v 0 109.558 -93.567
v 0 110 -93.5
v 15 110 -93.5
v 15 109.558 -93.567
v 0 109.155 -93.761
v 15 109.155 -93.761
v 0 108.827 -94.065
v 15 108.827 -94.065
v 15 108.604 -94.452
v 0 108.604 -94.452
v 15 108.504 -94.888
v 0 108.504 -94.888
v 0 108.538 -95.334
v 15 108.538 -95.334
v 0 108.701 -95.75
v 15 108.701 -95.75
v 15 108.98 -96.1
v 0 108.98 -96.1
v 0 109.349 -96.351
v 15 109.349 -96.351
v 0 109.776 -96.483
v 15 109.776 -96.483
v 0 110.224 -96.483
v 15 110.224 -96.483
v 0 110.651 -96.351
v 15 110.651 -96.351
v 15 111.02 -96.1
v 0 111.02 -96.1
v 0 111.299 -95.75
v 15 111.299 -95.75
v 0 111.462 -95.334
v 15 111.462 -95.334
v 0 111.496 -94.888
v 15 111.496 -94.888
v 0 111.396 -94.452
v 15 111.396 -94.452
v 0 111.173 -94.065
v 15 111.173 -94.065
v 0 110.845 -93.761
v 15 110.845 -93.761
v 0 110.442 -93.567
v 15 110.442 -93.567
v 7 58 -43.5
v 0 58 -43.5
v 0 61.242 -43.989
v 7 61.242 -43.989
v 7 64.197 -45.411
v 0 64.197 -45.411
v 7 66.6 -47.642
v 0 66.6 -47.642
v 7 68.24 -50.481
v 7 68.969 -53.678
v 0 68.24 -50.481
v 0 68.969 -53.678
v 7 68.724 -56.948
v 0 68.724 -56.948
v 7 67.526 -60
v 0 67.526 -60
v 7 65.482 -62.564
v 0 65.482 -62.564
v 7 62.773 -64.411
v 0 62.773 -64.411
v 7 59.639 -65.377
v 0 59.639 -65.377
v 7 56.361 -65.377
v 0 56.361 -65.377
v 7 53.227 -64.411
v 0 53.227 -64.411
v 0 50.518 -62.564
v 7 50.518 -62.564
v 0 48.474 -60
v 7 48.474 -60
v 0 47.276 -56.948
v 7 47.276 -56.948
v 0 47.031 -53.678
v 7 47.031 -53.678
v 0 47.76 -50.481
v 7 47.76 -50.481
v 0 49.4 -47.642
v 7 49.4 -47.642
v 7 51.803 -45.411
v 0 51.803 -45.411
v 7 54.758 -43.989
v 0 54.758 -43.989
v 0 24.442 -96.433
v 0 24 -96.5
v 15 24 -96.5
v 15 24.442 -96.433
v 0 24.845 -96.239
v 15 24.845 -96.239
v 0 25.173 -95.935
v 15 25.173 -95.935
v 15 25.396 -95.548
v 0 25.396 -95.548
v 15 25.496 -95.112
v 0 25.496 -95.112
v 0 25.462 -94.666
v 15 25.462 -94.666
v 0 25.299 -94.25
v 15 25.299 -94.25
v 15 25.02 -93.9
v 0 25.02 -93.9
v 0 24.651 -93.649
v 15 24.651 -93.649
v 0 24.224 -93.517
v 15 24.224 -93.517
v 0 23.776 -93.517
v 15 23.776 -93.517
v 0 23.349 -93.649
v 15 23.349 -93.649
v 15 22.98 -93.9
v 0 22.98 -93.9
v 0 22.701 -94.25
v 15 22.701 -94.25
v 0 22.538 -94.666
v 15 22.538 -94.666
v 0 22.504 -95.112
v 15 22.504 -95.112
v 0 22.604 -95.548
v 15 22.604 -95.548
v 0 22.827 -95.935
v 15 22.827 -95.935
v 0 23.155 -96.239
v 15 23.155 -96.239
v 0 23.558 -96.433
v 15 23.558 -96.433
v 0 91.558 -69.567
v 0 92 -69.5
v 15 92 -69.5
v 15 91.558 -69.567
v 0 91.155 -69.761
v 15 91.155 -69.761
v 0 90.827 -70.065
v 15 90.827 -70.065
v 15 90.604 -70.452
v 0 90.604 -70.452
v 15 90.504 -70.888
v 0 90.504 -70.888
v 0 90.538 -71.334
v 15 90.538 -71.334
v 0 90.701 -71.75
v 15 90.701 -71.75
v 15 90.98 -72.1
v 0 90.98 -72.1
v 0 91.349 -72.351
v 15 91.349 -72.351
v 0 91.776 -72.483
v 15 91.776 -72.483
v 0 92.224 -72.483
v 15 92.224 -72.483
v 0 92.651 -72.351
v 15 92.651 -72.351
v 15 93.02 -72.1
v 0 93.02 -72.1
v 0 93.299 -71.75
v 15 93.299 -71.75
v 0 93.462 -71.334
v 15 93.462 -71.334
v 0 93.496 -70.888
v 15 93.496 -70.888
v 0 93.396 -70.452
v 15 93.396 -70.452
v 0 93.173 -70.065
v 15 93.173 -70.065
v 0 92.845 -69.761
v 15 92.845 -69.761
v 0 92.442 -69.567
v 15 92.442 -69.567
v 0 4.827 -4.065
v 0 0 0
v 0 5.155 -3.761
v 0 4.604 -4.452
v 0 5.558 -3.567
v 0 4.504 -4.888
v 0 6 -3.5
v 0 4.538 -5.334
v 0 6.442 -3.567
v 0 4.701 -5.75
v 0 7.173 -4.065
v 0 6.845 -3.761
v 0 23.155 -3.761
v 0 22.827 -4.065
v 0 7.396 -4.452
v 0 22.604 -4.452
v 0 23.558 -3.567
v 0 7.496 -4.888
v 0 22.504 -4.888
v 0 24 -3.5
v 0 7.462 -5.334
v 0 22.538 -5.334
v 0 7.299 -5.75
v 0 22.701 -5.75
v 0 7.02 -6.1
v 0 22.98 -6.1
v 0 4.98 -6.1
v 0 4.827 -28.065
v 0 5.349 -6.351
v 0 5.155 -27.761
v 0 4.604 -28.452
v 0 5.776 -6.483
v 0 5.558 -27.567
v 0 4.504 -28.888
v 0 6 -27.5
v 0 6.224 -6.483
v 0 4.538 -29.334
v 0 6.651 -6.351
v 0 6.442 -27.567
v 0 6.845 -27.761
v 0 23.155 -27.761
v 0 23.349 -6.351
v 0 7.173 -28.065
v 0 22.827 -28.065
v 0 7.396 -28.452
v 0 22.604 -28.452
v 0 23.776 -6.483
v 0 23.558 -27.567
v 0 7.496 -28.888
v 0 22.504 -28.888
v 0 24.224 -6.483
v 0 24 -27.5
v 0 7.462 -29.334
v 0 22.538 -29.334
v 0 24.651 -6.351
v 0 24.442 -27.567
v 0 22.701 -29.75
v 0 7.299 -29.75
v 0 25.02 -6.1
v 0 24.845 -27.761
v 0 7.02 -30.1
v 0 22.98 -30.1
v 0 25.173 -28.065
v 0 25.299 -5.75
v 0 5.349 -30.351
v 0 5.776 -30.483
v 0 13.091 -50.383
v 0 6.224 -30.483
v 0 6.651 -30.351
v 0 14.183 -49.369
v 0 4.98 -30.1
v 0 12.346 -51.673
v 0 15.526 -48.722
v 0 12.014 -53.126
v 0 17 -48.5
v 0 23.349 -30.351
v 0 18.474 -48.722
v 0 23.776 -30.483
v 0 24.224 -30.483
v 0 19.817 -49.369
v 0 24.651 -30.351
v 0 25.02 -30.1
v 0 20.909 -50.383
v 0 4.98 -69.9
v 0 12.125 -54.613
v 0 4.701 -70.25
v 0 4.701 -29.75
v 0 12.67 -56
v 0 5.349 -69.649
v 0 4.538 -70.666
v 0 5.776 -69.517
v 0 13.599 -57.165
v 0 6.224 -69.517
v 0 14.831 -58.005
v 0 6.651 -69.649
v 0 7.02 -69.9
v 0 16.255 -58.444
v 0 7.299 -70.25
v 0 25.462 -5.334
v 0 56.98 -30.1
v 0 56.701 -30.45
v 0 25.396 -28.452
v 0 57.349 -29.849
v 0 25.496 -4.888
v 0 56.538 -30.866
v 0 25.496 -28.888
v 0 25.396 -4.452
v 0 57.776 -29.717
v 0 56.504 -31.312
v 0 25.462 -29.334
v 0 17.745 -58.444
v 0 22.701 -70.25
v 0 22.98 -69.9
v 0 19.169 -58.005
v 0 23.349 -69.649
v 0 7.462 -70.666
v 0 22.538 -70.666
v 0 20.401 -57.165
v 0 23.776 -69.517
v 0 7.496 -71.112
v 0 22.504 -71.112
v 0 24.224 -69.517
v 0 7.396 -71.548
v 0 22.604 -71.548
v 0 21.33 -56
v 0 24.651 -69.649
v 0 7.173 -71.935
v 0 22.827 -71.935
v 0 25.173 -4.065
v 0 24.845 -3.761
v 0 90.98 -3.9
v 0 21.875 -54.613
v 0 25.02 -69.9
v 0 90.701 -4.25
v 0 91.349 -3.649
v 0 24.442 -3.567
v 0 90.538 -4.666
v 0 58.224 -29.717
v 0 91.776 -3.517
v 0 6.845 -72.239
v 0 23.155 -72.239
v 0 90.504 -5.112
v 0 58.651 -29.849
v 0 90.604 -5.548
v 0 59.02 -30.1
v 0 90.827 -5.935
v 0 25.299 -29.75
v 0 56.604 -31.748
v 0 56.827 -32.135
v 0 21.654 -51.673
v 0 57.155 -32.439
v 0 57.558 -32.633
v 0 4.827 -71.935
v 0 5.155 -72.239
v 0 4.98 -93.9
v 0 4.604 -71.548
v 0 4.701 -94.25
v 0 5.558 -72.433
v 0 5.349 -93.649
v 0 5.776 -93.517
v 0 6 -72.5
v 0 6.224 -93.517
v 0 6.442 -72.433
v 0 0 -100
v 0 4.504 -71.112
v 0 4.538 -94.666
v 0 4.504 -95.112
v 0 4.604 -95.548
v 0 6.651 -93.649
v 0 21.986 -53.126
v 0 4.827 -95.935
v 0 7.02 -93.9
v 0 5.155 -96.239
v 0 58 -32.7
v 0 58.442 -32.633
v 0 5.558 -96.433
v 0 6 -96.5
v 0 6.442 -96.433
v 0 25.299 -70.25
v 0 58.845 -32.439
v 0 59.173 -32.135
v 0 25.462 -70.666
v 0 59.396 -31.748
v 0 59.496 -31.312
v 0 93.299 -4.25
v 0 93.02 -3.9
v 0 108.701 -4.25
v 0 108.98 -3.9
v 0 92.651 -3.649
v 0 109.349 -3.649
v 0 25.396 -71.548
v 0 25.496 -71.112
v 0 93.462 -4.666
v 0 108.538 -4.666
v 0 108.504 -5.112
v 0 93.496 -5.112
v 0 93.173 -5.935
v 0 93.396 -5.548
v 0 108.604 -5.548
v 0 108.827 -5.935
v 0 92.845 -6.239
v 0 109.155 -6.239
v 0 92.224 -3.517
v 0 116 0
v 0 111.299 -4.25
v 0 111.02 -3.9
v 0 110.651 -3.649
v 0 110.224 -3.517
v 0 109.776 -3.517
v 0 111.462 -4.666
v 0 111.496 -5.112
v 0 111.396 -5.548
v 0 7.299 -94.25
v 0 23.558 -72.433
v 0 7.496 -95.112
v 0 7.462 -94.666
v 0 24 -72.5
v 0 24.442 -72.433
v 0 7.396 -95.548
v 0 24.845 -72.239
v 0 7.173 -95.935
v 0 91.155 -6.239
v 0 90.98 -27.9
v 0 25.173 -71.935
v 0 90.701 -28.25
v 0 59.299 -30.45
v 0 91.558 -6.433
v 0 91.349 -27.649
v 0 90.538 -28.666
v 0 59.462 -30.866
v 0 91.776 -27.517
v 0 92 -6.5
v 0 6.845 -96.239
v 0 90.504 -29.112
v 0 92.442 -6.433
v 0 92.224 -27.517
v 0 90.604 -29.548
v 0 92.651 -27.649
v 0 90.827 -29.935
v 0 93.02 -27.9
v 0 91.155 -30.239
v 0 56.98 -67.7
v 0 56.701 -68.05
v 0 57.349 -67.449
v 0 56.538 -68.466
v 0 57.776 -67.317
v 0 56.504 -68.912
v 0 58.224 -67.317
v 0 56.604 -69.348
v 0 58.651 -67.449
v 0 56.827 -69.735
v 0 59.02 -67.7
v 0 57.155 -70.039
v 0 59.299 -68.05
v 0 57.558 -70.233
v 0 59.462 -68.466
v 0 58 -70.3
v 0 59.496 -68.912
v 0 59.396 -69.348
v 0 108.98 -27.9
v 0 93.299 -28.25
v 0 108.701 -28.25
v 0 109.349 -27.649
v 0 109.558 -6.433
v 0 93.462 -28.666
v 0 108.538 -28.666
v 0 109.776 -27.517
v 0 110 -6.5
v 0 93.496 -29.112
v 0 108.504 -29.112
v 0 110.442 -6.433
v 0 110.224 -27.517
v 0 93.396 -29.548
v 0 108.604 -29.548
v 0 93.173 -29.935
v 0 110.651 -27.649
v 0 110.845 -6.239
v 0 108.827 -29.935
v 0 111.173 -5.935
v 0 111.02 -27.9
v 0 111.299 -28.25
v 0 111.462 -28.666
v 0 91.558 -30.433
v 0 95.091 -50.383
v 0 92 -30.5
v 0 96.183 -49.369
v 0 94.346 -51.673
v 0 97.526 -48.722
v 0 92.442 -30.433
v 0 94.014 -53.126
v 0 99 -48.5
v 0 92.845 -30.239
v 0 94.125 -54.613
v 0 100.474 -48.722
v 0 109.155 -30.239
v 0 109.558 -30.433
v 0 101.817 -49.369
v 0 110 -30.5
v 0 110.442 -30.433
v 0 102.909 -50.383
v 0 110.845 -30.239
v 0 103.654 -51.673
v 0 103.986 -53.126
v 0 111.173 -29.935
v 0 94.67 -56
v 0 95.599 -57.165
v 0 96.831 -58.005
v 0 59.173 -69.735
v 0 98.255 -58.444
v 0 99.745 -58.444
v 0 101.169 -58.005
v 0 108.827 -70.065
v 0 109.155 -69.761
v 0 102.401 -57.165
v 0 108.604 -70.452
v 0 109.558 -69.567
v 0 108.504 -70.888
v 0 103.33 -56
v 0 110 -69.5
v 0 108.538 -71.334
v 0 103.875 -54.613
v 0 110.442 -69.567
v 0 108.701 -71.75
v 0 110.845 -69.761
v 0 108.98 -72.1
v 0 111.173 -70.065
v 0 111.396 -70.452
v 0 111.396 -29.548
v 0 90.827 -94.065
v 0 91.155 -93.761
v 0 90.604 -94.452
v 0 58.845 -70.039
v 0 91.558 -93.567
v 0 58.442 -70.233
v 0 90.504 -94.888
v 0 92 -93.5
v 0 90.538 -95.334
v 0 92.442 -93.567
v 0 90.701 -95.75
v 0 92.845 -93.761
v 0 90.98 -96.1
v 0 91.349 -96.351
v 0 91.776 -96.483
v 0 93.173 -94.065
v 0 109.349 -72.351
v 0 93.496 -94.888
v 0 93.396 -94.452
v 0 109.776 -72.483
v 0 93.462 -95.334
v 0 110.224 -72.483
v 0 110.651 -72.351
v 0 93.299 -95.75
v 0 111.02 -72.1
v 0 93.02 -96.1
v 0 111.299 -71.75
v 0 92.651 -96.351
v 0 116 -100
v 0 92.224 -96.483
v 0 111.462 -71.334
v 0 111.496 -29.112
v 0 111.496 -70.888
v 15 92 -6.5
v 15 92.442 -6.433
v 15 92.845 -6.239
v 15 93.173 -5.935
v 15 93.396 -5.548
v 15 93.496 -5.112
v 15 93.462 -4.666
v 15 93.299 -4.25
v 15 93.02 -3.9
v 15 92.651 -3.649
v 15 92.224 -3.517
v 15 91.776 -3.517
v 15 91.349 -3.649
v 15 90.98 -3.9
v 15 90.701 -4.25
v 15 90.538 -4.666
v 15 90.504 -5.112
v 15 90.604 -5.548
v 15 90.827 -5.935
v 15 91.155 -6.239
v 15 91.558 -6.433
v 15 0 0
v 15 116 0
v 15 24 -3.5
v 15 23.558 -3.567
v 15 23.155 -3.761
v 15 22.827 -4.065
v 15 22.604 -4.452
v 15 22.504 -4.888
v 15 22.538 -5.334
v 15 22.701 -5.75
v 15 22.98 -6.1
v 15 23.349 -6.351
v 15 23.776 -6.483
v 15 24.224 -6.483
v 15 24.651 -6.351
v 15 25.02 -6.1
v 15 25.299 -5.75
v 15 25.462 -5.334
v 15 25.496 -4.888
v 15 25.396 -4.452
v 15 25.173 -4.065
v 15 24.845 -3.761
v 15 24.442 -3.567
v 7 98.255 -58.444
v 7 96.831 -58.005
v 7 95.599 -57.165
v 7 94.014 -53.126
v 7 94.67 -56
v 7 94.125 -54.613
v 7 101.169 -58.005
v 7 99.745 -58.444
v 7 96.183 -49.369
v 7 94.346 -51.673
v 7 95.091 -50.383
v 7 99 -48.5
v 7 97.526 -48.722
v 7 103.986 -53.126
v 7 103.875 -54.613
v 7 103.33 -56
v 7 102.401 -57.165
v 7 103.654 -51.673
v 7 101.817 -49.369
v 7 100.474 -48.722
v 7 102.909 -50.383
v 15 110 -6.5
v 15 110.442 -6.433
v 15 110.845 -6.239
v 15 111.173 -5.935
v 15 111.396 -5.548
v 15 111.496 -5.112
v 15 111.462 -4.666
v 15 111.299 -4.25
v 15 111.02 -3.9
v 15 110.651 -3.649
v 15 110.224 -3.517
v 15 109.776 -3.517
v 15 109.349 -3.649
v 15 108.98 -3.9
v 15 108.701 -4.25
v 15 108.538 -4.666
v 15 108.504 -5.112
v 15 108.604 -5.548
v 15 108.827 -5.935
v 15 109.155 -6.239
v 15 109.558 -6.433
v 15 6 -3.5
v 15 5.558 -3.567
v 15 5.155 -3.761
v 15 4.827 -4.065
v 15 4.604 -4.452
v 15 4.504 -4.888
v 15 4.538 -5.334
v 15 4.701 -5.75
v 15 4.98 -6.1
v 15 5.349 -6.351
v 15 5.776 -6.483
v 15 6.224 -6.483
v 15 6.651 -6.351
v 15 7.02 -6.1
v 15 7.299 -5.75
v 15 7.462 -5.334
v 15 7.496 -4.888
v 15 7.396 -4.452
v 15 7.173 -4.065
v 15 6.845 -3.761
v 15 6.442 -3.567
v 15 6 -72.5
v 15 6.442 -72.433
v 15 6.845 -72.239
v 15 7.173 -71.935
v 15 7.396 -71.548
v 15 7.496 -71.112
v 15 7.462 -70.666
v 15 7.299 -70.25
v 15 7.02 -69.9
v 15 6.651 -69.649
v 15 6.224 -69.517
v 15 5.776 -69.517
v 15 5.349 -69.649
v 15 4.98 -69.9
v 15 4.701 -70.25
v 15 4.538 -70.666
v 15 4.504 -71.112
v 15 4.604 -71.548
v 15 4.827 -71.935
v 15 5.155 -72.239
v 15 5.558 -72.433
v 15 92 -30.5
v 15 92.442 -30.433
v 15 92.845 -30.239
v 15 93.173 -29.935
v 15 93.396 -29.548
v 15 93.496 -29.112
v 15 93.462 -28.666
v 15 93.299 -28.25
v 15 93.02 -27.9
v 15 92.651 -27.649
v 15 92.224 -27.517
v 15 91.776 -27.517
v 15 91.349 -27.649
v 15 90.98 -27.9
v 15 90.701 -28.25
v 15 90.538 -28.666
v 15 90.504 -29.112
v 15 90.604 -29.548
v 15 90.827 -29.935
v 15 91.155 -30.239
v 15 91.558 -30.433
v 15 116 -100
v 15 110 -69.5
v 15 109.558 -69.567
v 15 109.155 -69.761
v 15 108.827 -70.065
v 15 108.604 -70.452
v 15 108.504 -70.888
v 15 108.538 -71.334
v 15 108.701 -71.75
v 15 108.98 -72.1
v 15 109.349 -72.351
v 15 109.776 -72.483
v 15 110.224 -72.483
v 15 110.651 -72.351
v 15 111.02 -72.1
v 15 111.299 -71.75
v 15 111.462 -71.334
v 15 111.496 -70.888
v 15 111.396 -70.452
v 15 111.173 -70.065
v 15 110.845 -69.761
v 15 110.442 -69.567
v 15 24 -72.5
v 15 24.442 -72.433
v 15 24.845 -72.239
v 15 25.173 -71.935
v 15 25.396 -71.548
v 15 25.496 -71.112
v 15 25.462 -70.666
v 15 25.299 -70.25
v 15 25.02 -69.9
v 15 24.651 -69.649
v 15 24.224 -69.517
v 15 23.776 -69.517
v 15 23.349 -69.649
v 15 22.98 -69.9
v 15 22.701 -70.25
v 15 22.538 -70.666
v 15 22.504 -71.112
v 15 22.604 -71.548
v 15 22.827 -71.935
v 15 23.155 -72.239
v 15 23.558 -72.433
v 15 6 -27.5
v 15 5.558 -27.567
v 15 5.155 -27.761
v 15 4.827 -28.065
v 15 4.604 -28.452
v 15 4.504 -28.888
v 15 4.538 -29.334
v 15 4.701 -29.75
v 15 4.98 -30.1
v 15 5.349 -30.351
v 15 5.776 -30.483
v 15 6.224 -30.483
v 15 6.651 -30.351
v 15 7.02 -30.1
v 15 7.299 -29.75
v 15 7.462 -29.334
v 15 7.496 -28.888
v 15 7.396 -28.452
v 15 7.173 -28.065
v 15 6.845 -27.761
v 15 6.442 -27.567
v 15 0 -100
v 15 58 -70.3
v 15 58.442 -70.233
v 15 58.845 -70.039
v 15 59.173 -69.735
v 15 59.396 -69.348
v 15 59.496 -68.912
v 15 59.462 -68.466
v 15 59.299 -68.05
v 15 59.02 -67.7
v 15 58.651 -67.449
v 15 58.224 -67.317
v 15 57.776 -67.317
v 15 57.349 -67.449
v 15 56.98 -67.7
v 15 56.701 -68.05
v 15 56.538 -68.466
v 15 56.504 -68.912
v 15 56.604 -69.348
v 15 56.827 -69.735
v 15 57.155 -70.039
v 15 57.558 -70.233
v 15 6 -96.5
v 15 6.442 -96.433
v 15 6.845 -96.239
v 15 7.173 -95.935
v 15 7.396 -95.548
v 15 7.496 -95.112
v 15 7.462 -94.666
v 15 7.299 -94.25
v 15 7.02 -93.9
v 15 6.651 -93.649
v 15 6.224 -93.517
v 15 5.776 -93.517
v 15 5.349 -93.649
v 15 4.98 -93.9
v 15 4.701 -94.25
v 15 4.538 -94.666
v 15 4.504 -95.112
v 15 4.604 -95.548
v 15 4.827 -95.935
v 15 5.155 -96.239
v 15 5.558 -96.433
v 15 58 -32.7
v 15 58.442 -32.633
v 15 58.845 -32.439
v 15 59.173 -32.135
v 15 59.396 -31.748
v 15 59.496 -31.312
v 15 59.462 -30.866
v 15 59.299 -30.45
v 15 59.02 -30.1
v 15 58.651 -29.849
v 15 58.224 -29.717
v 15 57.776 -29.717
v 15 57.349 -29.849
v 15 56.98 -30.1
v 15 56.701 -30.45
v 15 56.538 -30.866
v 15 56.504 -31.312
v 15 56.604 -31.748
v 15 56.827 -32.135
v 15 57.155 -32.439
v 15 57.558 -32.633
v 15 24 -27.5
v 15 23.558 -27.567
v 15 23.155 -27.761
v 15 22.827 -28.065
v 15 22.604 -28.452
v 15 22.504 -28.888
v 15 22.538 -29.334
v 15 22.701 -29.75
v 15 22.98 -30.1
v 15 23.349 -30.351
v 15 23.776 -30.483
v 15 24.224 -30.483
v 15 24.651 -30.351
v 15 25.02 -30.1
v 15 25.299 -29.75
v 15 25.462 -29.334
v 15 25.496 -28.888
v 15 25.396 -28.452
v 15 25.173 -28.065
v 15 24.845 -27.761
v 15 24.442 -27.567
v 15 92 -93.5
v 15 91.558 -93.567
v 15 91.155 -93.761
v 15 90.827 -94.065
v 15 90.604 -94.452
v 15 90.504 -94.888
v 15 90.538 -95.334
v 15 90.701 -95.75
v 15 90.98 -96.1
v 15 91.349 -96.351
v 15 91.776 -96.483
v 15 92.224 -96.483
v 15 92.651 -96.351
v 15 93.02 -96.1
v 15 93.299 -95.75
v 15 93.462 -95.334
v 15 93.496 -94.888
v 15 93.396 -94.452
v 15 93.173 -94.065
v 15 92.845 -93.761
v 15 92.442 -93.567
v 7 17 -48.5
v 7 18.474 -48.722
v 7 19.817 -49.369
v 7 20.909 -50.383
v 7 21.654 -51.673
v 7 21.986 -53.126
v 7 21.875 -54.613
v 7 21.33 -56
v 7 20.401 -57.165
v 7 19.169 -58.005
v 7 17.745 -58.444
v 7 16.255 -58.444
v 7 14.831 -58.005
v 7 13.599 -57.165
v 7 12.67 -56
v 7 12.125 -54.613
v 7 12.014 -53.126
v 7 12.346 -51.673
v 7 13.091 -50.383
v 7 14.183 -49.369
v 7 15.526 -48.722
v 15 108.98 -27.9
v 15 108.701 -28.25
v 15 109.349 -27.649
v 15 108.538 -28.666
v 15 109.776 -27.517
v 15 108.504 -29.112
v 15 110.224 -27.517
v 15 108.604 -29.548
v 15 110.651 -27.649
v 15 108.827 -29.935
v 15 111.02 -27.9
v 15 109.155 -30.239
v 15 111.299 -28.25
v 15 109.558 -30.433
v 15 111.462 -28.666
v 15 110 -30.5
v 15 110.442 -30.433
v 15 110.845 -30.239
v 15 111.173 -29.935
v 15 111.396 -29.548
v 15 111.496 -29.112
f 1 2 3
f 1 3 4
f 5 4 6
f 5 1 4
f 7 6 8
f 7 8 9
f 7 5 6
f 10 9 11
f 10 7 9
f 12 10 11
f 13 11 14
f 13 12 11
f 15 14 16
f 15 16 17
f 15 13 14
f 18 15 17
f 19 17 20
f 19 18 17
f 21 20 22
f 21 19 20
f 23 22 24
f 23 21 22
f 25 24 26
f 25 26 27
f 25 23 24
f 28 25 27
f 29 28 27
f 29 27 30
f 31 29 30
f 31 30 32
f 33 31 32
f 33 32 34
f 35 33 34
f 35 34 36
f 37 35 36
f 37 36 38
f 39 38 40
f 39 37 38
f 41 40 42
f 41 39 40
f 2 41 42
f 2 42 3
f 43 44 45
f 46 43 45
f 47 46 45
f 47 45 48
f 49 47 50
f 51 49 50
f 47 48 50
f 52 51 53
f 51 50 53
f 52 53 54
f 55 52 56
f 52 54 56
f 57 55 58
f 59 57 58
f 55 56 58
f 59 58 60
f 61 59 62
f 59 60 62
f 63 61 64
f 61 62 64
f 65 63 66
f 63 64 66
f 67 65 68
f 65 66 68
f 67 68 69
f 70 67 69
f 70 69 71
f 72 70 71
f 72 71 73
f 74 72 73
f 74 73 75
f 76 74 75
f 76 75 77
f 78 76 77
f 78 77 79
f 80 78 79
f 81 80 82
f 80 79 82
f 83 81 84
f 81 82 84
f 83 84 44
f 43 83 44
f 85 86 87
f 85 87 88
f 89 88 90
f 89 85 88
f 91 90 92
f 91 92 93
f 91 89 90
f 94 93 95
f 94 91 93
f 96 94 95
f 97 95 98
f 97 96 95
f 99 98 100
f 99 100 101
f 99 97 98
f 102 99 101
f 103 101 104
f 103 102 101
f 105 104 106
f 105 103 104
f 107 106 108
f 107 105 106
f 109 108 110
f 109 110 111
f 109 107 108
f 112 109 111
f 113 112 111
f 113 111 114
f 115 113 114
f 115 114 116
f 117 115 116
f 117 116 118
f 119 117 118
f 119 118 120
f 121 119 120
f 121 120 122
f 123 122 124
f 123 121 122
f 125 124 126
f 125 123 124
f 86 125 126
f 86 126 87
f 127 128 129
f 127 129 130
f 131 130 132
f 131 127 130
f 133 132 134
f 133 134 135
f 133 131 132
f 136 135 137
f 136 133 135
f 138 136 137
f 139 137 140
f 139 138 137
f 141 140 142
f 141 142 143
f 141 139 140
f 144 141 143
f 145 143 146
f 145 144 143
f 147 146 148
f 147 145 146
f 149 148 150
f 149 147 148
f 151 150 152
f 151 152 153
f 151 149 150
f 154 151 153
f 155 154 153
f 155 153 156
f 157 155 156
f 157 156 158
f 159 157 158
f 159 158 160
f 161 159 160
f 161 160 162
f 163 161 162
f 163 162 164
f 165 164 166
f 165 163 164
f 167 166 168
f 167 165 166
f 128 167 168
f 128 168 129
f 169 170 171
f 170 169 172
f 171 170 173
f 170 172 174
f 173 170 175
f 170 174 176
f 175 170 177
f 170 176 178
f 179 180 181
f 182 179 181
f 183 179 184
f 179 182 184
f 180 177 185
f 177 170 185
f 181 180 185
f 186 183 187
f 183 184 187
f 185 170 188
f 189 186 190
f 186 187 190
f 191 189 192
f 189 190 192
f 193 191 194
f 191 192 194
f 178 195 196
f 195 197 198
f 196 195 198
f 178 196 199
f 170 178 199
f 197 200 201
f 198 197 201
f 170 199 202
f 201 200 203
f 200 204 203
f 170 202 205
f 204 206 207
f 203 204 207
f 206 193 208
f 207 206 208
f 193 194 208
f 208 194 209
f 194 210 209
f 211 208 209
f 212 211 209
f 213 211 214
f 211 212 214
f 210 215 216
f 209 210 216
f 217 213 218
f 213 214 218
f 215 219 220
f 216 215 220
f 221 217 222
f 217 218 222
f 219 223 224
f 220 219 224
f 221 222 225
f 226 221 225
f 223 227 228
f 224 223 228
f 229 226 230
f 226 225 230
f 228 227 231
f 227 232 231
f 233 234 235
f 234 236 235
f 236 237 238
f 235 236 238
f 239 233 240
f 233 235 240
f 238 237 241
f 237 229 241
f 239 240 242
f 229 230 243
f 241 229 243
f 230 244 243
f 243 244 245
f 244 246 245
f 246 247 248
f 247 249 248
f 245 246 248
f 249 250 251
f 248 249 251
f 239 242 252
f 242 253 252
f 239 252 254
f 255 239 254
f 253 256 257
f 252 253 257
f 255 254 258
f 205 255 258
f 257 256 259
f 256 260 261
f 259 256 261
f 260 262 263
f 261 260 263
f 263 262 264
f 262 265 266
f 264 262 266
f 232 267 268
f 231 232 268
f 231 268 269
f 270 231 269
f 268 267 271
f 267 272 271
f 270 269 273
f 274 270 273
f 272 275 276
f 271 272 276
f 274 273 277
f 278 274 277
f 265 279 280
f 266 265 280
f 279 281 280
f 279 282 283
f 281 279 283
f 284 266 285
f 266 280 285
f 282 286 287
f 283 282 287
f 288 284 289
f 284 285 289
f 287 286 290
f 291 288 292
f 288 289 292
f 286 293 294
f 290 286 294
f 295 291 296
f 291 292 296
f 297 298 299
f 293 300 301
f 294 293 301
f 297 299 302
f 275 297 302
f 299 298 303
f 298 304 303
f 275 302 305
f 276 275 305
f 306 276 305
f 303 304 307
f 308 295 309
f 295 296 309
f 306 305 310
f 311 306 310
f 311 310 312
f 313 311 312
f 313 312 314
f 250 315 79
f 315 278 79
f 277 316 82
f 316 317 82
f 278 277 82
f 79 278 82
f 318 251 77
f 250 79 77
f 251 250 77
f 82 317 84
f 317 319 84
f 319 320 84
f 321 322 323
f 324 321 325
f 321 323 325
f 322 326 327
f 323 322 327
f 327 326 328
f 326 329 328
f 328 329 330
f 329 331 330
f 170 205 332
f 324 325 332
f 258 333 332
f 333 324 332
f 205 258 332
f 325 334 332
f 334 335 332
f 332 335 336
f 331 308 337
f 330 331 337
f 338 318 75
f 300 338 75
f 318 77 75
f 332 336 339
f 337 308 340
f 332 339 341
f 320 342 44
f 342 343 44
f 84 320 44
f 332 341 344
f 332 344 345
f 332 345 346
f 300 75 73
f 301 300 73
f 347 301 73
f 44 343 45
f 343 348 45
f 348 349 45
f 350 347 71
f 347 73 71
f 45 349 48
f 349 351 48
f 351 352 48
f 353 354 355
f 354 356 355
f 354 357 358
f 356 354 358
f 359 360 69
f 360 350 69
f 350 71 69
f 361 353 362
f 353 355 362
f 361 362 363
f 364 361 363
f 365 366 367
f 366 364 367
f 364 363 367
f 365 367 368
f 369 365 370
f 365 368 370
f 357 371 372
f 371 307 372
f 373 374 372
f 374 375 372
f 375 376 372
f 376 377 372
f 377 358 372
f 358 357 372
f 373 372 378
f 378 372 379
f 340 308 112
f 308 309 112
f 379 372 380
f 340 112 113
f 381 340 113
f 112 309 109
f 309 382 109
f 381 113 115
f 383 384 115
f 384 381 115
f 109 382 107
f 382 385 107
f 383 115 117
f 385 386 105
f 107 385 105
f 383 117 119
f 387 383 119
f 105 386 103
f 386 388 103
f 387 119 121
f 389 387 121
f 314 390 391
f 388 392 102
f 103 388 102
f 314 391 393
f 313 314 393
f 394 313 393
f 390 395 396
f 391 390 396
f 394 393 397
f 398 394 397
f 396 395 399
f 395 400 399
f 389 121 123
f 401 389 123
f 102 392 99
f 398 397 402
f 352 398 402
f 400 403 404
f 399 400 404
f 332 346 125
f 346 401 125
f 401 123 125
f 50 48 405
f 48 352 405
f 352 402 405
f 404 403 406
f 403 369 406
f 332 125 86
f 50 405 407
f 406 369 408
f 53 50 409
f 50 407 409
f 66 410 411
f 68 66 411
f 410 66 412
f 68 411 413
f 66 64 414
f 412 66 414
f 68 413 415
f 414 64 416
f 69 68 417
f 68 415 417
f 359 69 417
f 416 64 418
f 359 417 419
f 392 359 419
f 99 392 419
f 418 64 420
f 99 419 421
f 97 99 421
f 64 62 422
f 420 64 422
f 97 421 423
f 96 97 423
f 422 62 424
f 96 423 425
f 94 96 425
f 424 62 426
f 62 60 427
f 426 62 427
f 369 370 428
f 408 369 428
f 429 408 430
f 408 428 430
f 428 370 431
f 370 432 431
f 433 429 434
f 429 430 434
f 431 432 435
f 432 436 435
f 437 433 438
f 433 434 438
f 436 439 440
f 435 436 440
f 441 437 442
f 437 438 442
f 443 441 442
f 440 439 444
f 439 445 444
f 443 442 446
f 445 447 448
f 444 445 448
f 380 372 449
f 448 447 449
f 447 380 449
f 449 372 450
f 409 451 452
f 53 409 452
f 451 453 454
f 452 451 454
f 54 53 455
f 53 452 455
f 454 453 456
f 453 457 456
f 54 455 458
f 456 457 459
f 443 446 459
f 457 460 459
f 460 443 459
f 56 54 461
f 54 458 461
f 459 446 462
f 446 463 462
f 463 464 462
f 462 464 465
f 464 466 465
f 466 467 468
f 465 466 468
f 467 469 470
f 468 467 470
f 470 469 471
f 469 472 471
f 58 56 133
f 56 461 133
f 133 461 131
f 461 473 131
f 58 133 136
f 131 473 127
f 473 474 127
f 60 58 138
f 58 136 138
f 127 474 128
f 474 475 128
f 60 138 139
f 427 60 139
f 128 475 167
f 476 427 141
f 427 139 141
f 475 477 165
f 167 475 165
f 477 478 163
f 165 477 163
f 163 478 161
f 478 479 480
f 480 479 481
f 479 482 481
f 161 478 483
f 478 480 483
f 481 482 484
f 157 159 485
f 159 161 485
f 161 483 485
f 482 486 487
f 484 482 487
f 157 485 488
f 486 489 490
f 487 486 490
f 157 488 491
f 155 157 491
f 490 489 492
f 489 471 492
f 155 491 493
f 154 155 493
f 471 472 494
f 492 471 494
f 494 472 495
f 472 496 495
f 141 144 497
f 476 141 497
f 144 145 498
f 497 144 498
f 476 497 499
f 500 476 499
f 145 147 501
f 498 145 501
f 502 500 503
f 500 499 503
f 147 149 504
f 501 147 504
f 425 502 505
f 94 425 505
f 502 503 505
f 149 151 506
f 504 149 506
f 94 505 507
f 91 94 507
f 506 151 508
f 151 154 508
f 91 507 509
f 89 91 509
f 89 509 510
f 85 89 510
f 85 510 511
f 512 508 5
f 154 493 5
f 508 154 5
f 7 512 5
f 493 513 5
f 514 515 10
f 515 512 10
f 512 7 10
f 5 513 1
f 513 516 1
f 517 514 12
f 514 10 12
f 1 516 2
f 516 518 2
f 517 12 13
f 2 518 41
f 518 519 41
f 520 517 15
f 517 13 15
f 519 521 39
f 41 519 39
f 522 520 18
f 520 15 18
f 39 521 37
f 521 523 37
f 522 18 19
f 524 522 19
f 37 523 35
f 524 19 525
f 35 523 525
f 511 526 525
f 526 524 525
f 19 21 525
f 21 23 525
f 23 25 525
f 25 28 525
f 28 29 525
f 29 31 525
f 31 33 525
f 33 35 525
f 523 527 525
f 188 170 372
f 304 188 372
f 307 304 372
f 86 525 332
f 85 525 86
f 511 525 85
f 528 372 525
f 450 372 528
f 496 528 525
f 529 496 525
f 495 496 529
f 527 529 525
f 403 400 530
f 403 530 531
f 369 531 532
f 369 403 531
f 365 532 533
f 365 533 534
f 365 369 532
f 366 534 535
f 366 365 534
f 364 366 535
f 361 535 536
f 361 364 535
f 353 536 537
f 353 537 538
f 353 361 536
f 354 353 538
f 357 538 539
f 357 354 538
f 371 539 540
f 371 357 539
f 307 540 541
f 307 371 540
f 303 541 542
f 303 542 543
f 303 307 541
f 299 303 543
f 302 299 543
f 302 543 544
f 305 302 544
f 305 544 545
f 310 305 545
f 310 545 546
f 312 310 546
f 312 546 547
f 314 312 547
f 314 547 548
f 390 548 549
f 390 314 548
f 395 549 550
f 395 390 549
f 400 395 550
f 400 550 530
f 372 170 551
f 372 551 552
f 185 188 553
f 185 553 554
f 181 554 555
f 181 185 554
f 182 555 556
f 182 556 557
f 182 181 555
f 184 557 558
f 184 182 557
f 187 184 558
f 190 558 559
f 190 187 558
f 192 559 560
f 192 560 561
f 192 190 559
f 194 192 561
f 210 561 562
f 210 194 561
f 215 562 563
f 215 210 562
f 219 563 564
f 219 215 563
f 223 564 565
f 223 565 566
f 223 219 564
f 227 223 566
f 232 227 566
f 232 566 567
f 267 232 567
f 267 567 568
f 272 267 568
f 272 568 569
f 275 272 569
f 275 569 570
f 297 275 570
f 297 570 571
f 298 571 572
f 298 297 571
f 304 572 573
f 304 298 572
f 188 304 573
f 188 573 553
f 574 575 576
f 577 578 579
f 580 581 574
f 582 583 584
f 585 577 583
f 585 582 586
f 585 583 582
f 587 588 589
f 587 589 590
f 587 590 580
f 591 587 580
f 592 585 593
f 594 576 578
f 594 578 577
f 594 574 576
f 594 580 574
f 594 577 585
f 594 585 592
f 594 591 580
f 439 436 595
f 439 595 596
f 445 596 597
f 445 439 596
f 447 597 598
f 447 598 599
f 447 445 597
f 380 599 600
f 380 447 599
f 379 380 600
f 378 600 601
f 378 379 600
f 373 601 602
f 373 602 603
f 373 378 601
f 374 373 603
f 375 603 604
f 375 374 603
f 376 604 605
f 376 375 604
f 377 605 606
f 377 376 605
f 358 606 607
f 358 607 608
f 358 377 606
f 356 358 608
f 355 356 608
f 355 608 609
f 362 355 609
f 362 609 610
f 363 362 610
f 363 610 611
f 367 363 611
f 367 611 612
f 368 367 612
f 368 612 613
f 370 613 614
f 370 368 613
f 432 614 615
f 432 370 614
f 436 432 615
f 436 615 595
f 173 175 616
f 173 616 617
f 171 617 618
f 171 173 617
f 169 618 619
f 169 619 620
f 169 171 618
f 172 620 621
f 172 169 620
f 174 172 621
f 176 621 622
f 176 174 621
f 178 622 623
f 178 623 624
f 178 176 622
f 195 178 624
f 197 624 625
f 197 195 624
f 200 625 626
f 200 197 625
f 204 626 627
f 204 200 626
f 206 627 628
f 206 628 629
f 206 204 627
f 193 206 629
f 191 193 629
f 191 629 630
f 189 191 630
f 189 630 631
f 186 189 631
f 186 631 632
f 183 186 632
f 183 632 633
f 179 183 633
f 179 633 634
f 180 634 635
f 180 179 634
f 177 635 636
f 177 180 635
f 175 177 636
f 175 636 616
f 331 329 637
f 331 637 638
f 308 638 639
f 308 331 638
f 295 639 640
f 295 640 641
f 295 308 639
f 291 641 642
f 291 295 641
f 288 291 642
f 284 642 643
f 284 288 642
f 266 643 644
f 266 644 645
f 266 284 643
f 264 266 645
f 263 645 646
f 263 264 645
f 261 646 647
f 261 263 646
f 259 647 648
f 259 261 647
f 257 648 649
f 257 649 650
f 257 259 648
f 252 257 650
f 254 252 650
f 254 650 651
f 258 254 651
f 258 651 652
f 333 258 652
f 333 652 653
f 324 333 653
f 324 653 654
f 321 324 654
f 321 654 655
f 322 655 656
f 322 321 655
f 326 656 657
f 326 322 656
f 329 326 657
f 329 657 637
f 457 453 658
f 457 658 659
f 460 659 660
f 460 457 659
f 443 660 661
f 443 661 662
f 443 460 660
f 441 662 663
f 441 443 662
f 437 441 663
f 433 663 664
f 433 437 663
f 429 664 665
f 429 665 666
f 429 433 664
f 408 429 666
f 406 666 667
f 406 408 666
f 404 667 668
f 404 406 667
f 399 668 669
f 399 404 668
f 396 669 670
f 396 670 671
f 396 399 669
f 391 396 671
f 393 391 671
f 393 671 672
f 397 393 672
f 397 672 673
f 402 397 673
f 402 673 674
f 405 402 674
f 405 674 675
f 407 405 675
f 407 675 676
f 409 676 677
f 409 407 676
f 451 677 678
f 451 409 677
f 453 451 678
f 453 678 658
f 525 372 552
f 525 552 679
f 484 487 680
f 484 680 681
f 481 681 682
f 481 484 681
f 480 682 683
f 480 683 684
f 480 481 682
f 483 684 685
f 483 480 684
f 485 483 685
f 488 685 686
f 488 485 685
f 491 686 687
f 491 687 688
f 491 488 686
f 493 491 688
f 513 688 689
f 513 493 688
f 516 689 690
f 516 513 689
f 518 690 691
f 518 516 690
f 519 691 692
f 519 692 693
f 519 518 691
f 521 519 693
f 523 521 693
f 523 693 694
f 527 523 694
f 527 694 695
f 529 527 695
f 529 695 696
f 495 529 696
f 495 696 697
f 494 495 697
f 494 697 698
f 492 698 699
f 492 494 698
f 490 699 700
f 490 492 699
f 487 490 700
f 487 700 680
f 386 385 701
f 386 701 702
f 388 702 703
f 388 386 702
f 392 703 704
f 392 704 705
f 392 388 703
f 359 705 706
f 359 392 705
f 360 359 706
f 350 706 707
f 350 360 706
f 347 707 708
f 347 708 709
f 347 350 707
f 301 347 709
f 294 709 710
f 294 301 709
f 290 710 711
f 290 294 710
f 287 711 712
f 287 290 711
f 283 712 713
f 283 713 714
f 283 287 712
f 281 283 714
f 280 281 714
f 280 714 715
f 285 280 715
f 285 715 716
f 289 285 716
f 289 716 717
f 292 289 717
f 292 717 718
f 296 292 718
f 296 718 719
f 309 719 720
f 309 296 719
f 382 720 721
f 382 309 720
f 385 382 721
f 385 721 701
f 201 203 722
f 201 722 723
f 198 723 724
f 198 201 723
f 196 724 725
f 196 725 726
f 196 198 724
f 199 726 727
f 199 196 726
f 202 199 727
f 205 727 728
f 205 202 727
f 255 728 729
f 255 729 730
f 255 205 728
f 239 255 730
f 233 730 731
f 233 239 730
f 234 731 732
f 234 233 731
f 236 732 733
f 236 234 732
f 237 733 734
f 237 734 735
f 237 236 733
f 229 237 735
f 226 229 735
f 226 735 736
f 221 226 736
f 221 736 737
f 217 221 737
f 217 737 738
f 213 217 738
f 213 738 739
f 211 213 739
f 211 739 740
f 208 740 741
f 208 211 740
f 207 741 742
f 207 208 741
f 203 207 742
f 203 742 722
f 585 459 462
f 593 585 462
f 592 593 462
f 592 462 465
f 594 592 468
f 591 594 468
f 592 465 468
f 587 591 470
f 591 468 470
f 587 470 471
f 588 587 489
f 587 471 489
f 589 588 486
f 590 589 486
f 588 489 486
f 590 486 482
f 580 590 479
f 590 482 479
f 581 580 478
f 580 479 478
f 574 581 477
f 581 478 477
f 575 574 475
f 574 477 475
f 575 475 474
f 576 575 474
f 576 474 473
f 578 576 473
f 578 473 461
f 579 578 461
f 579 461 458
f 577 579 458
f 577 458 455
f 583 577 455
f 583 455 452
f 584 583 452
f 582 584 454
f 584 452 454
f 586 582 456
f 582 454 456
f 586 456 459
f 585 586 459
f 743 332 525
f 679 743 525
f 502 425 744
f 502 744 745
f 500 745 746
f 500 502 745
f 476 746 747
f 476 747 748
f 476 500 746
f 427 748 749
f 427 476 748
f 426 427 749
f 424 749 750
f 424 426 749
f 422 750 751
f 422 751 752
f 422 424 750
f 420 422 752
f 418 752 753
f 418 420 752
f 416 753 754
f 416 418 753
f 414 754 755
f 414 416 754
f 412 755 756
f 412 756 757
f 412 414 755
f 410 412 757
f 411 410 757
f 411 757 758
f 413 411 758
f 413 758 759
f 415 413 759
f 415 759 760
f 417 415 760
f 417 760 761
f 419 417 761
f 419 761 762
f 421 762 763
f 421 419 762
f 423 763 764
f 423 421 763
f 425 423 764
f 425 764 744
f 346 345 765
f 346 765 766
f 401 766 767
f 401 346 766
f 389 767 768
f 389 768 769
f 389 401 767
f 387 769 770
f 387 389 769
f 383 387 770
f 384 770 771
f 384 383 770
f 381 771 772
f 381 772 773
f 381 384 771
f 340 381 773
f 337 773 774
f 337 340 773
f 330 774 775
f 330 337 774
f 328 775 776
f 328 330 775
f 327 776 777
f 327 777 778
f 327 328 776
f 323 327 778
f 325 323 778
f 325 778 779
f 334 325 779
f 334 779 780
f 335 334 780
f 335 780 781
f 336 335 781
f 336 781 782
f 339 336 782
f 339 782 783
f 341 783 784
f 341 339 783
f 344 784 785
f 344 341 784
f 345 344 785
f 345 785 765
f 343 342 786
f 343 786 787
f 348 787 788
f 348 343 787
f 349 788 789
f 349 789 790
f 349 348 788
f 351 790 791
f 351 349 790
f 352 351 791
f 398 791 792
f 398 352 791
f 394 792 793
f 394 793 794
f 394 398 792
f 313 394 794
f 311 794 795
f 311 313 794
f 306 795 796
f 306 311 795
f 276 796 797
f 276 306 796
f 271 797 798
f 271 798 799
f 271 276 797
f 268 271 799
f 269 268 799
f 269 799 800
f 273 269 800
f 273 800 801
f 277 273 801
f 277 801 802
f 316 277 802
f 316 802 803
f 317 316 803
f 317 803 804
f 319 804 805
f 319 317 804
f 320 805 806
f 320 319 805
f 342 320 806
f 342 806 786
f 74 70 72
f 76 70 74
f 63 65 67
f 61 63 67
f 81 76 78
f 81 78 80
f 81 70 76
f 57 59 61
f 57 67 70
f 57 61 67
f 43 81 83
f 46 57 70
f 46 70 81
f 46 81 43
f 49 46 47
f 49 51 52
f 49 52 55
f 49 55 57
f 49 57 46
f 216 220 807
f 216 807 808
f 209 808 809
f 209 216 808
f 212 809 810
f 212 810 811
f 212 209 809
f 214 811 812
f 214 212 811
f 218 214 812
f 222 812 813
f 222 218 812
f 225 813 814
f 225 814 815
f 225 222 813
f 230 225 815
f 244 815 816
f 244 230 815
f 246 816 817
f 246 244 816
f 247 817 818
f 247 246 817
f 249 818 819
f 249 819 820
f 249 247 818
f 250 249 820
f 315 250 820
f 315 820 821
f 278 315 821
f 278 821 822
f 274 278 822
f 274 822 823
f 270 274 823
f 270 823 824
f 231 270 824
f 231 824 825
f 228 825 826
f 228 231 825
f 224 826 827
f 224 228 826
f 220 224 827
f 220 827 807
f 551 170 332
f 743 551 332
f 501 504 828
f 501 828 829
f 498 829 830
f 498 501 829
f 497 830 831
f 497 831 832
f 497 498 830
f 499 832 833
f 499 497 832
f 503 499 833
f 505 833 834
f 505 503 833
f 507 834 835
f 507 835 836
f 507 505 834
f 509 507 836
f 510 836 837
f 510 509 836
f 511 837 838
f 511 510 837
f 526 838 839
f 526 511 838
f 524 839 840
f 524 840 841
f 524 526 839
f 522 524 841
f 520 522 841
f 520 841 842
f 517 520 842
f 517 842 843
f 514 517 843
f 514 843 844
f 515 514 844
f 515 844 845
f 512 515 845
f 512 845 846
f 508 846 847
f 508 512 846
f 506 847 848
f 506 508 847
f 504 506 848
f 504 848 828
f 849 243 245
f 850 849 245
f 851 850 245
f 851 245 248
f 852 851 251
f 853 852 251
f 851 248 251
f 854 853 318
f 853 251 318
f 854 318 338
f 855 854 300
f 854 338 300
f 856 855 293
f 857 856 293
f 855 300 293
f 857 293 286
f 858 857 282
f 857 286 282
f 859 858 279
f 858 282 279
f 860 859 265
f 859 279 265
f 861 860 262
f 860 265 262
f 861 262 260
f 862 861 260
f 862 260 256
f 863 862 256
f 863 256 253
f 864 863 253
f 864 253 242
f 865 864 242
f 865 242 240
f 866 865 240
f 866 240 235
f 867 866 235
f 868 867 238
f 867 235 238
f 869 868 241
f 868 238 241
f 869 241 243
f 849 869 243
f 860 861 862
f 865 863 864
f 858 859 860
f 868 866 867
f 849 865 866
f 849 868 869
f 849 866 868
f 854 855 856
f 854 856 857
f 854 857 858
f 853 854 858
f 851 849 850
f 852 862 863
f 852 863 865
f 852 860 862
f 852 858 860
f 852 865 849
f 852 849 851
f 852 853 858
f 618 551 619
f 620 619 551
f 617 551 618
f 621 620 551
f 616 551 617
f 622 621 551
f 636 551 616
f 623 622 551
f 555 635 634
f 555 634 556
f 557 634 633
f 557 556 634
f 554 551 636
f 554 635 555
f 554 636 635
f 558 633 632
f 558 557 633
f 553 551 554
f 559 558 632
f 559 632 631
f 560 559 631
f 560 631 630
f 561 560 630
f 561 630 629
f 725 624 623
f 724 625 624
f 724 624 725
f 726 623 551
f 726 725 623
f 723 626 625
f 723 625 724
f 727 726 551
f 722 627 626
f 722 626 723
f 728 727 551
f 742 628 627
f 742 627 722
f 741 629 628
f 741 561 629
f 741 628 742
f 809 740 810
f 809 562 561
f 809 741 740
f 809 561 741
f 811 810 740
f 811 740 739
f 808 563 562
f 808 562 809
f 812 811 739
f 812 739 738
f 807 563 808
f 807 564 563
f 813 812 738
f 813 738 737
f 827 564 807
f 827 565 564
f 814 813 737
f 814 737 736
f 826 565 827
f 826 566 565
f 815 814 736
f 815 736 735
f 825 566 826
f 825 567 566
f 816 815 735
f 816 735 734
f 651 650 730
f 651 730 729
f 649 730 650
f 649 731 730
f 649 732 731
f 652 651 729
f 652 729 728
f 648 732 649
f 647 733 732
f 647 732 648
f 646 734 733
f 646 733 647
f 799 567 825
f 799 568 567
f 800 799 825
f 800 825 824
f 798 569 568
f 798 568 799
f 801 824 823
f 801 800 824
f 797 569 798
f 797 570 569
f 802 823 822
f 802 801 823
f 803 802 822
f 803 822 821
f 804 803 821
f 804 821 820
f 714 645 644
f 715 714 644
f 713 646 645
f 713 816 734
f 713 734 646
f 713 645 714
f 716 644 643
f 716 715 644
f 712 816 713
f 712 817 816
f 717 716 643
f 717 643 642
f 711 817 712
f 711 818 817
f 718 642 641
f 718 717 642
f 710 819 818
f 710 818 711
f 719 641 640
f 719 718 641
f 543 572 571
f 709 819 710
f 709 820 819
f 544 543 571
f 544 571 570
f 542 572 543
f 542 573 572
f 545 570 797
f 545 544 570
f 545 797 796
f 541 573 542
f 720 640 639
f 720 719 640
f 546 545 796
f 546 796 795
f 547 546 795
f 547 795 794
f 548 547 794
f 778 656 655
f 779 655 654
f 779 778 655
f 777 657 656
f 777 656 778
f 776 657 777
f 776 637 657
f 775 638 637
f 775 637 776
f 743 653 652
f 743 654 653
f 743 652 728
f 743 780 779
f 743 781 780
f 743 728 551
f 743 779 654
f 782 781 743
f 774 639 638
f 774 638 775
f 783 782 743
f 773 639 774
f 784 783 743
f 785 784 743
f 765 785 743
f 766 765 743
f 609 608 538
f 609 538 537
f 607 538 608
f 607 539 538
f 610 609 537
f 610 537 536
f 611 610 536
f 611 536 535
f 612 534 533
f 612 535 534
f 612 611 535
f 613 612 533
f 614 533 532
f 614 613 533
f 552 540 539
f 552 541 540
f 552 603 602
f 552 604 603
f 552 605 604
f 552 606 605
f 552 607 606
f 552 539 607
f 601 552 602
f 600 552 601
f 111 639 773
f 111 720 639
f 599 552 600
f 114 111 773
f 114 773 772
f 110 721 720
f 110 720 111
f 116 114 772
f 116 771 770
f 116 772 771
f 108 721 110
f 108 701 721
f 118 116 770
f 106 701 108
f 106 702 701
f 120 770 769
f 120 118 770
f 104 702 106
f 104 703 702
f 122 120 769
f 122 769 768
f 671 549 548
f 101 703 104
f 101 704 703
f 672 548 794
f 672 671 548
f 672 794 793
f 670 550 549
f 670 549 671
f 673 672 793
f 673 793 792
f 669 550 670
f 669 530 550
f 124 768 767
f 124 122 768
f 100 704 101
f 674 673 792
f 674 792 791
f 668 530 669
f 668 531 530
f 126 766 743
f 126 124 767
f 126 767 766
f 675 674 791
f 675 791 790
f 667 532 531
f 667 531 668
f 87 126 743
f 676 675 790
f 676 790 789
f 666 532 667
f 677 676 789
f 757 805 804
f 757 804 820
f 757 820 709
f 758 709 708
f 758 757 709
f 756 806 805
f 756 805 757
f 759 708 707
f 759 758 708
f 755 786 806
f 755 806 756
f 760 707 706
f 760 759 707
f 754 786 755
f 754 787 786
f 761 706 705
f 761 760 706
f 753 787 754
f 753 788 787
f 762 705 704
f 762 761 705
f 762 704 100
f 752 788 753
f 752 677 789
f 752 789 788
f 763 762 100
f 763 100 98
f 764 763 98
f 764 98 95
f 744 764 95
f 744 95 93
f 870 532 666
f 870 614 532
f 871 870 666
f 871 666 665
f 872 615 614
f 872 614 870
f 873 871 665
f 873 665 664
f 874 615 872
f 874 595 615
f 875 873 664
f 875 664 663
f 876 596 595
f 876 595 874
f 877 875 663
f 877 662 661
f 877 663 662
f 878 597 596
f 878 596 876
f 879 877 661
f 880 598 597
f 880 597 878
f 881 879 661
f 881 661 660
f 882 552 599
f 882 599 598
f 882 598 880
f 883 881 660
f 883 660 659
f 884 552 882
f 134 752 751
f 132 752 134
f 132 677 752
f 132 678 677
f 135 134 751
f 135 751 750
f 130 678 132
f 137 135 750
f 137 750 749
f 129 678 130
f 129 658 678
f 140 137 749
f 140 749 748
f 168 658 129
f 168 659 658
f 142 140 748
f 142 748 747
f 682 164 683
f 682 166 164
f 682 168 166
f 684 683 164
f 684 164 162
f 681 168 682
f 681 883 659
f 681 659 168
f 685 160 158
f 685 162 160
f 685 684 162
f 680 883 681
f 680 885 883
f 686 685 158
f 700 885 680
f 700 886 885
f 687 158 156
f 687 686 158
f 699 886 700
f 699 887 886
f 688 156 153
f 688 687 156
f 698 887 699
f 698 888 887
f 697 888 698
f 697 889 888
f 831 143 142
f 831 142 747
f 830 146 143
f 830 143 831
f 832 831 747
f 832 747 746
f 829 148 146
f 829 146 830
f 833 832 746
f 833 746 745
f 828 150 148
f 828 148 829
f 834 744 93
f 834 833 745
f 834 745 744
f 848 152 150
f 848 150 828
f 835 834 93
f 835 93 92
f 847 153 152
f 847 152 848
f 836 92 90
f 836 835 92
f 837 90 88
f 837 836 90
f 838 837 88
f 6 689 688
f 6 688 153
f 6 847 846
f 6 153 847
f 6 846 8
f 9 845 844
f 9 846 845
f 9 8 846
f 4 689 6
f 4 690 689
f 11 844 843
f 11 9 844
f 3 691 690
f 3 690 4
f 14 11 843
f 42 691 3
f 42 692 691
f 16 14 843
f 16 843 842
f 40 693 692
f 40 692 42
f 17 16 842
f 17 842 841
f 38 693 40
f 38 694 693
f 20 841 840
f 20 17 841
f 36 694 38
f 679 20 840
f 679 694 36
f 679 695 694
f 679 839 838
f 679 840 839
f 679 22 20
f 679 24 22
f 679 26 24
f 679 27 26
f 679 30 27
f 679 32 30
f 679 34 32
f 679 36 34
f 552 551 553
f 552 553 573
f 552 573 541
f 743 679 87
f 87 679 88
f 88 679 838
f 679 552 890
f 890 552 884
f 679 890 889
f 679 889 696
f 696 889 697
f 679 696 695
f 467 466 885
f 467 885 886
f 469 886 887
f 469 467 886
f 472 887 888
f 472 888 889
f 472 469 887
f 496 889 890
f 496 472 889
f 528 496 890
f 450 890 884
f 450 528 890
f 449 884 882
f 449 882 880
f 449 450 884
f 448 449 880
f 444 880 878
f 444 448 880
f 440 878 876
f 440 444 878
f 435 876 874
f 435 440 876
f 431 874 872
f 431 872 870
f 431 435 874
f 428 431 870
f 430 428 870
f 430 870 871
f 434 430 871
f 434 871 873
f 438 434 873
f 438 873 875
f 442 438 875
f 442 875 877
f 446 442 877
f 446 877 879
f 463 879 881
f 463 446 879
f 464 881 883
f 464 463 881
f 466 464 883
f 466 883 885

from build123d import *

# Parameters (mm, degrees)
CROQUIS1_W              = 100
CROQUIS1_H              = 116
CROQUIS1_R              = 1.5
SALIENTE_EXTRUIR1_DEPTH = 15
CROQUIS3_R              = 5
CROQUIS3_R_2            = 11
CORTAR_EXTRUIR2_DEPTH   = 7


with BuildPart() as part:
    # Croquis1 → Saliente-Extruir1 (new body)
    with BuildSketch(Plane(origin=(0, 0, 0), x_dir=(0, 0, -1), z_dir=(1, 0, 0))):
        with Locations((50, 58)):
            Rectangle(CROQUIS1_W, CROQUIS1_H)
        with Locations((5, 110)):
            Circle(CROQUIS1_R, mode=Mode.SUBTRACT)
        with Locations((29, 110)):
            Circle(CROQUIS1_R, mode=Mode.SUBTRACT)
        with Locations((5, 92)):
            Circle(CROQUIS1_R, mode=Mode.SUBTRACT)
        with Locations((29, 92)):
            Circle(CROQUIS1_R, mode=Mode.SUBTRACT)
        with Locations(Location((5, 24, 0), (0, 0, 180))):
            Circle(CROQUIS1_R, mode=Mode.SUBTRACT)
        with Locations(Location((29, 24, 0), (0, 0, 180))):
            Circle(CROQUIS1_R, mode=Mode.SUBTRACT)
        with Locations(Location((29, 6, 0), (0, 0, 180))):
            Circle(CROQUIS1_R, mode=Mode.SUBTRACT)
        with Locations(Location((5, 6, 0), (0, 0, 180))):
            Circle(CROQUIS1_R, mode=Mode.SUBTRACT)
        with Locations((31.2, 58)):
            Circle(CROQUIS1_R, mode=Mode.SUBTRACT)
        with Locations((68.8, 58)):
            Circle(CROQUIS1_R, mode=Mode.SUBTRACT)
        with Locations((71, 6)):
            Circle(CROQUIS1_R, mode=Mode.SUBTRACT)
        with Locations((95, 6)):
            Circle(CROQUIS1_R, mode=Mode.SUBTRACT)
        with Locations((95, 24)):
            Circle(CROQUIS1_R, mode=Mode.SUBTRACT)
        with Locations((71, 24)):
            Circle(CROQUIS1_R, mode=Mode.SUBTRACT)
        with Locations(Location((95, 92, 0), (0, 0, 180))):
            Circle(CROQUIS1_R, mode=Mode.SUBTRACT)
        with Locations(Location((71, 92, 0), (0, 0, 180))):
            Circle(CROQUIS1_R, mode=Mode.SUBTRACT)
        with Locations(Location((71, 110, 0), (0, 0, 180))):
            Circle(CROQUIS1_R, mode=Mode.SUBTRACT)
        with Locations(Location((95, 110, 0), (0, 0, 180))):
            Circle(CROQUIS1_R, mode=Mode.SUBTRACT)
    extrude(amount=SALIENTE_EXTRUIR1_DEPTH)

    # Croquis3 → Cortar-Extruir2 (cut)
    with BuildSketch(Plane.ZY):
        with Locations((-53.5, 99)):
            Circle(CROQUIS3_R)
        with Locations((-53.5, 17)):
            Circle(CROQUIS3_R)
        with Locations((-54.5, 58)):
            Circle(CROQUIS3_R_2)
    extrude(amount=-CORTAR_EXTRUIR2_DEPTH, mode=Mode.SUBTRACT)


solid = part.part
